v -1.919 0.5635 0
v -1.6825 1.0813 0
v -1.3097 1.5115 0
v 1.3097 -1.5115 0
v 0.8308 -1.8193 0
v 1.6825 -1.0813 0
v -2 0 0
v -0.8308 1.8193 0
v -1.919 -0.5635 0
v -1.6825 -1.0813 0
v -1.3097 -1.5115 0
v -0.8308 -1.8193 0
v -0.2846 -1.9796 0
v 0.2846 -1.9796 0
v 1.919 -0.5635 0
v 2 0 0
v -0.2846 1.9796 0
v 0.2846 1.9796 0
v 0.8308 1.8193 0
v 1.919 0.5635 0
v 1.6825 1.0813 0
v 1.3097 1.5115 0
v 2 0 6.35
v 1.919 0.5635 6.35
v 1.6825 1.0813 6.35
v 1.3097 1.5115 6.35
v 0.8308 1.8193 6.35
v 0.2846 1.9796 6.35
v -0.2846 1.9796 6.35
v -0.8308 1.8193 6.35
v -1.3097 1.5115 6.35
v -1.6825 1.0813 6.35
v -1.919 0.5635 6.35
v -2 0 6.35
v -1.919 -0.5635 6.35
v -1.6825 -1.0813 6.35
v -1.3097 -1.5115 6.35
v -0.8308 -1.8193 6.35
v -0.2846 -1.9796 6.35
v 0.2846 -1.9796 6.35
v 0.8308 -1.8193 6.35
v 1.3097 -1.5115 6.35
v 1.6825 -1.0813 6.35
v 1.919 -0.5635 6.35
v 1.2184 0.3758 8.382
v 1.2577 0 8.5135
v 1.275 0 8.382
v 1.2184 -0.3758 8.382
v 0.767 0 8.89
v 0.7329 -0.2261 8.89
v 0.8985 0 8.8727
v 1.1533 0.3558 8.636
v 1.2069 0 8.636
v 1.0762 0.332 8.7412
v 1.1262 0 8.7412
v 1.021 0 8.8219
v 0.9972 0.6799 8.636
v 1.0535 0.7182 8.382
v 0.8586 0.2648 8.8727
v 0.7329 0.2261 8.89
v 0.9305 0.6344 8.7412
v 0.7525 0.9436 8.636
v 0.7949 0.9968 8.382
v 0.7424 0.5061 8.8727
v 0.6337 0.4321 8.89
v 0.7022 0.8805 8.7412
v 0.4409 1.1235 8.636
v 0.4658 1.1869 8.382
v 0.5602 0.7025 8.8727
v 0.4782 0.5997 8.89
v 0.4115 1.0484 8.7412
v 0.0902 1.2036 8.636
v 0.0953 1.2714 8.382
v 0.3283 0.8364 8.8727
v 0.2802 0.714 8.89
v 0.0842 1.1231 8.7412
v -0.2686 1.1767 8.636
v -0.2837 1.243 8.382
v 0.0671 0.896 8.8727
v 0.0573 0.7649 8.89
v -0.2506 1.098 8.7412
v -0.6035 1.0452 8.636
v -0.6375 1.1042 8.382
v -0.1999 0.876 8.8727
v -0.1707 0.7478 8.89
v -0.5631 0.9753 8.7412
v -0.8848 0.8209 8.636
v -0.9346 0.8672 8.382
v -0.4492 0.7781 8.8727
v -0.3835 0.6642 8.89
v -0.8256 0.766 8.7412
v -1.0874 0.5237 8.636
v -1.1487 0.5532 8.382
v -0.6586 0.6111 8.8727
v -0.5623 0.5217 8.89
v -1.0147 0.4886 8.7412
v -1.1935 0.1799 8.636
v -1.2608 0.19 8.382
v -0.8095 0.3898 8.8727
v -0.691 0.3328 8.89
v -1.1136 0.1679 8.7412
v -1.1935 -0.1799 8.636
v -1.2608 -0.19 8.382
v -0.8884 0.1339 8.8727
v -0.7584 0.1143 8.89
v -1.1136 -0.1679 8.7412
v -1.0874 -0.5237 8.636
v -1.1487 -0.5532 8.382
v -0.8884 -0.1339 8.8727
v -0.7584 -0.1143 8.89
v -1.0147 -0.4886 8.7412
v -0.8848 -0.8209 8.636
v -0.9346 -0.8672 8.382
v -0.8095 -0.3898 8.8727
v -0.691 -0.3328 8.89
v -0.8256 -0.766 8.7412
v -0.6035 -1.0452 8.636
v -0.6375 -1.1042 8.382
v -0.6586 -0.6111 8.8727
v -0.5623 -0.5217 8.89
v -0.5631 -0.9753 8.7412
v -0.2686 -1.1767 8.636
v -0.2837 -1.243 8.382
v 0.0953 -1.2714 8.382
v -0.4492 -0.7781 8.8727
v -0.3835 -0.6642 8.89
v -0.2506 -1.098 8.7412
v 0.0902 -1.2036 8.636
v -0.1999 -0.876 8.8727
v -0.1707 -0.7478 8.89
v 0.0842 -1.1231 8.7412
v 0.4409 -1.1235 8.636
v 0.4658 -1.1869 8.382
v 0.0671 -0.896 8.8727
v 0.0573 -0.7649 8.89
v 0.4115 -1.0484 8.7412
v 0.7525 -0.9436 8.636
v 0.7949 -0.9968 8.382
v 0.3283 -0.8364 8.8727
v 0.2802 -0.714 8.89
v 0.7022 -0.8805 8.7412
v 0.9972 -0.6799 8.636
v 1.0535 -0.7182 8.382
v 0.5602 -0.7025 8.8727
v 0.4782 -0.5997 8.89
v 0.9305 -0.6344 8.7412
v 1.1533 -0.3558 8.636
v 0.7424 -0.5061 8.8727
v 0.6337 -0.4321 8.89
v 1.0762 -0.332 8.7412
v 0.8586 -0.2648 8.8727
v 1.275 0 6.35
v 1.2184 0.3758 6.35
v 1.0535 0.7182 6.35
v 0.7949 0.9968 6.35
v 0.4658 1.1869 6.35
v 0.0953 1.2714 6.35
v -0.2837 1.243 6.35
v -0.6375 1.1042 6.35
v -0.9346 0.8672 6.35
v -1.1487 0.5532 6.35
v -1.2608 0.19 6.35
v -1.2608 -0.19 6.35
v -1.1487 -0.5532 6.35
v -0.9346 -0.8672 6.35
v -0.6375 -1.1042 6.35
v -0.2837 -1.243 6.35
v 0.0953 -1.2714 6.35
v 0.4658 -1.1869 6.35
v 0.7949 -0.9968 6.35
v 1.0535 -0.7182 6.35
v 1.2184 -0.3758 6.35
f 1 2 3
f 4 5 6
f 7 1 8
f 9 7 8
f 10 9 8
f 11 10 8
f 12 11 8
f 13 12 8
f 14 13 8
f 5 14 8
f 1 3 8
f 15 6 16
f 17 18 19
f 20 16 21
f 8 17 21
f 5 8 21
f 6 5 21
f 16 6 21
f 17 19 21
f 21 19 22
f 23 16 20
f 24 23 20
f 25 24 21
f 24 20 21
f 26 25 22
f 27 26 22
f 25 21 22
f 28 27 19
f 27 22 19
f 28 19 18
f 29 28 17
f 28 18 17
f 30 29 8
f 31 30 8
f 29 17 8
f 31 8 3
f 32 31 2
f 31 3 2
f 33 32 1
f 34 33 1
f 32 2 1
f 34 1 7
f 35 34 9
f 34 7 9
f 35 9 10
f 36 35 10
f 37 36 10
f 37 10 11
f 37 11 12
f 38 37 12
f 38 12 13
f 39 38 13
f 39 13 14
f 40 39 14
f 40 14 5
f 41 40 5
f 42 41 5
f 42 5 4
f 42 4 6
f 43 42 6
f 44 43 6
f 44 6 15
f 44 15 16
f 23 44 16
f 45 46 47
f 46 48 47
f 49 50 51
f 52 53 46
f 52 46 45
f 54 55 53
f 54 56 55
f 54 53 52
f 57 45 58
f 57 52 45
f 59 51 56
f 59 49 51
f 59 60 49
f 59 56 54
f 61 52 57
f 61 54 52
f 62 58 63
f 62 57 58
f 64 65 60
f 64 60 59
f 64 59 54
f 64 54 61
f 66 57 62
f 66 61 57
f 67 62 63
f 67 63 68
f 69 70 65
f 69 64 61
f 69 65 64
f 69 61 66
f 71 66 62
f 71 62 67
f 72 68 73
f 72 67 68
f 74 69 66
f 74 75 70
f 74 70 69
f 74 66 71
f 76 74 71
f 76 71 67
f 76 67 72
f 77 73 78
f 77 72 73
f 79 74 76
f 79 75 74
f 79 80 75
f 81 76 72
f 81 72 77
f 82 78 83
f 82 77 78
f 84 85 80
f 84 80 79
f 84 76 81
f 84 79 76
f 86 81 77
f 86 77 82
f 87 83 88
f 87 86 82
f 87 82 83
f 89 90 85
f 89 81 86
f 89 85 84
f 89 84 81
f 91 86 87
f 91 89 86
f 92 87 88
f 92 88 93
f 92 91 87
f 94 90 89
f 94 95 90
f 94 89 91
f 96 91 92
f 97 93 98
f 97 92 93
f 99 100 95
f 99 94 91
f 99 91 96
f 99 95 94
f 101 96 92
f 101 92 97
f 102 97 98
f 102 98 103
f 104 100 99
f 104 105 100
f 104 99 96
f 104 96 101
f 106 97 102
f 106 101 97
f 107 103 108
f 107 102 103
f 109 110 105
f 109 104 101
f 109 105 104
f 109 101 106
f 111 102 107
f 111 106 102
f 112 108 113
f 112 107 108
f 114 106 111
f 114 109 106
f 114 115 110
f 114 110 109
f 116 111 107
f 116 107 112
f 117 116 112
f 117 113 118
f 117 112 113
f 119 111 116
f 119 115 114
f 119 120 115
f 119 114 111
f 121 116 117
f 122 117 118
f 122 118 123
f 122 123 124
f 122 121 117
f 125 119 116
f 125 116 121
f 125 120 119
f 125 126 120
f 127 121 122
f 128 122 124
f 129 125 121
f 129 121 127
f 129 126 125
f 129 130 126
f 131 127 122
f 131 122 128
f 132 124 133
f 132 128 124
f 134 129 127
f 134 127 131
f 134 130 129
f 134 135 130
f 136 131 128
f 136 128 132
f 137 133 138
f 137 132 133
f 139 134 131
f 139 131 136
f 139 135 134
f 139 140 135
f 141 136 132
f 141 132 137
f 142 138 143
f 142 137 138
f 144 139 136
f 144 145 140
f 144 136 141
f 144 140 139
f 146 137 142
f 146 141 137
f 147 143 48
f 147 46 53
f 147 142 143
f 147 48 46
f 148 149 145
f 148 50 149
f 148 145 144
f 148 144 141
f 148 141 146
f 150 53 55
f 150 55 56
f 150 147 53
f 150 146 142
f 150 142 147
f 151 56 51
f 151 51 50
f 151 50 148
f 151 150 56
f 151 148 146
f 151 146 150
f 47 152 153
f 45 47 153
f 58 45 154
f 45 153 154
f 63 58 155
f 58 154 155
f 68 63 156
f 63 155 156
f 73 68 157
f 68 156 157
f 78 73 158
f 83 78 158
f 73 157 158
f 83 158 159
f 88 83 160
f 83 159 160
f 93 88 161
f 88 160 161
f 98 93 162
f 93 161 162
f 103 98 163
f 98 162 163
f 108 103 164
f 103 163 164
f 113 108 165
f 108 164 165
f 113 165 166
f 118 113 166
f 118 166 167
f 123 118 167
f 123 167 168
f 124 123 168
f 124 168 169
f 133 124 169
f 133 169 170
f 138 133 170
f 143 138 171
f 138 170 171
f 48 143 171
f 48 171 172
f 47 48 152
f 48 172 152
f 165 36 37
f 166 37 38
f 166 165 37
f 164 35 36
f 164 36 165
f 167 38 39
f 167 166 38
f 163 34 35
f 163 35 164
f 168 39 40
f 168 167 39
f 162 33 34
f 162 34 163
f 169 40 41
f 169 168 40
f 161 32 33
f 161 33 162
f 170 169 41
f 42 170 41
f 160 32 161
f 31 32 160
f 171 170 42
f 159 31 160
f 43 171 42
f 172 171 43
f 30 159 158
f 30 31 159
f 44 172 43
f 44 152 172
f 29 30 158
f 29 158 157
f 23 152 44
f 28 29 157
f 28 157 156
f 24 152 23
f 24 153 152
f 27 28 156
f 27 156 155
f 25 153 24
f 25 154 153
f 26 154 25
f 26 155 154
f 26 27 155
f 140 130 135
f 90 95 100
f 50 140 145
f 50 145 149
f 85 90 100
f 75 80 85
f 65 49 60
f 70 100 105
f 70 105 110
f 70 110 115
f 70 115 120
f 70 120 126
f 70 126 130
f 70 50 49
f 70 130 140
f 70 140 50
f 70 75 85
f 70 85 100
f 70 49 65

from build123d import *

# Parameters (mm, degrees)
SKETCH1_R           = 2
BOSS_EXTRUDE1_DEPTH = 8.89
CUT_EXTRUDE1_START  = -2.54
SKETCH2_R           = 2
SKETCH2_R_2         = 1.275
CUT_EXTRUDE1_DEPTH  = 2.54
FILLET2_R           = 0.508


with BuildPart() as part:
    # Sketch1 → Boss-Extrude1 (new body)
    with BuildSketch(Plane.XY):
        Circle(SKETCH1_R)
    extrude(amount=BOSS_EXTRUDE1_DEPTH)

    # Sketch2 → Cut-Extrude1 (cut)
    with BuildSketch(Plane.XY.offset(8.89).offset(CUT_EXTRUDE1_START)):
        Circle(SKETCH2_R)
        Circle(SKETCH2_R_2, mode=Mode.SUBTRACT)
    extrude(amount=CUT_EXTRUDE1_DEPTH, mode=Mode.SUBTRACT)

    # Fillet2
    fillet2_edges = [part.edges().sort_by_distance(p)[0] for p in [
        (-1.275, 0, 8.89),
    ]]
    fillet(fillet2_edges, radius=FILLET2_R)


solid = part.part
